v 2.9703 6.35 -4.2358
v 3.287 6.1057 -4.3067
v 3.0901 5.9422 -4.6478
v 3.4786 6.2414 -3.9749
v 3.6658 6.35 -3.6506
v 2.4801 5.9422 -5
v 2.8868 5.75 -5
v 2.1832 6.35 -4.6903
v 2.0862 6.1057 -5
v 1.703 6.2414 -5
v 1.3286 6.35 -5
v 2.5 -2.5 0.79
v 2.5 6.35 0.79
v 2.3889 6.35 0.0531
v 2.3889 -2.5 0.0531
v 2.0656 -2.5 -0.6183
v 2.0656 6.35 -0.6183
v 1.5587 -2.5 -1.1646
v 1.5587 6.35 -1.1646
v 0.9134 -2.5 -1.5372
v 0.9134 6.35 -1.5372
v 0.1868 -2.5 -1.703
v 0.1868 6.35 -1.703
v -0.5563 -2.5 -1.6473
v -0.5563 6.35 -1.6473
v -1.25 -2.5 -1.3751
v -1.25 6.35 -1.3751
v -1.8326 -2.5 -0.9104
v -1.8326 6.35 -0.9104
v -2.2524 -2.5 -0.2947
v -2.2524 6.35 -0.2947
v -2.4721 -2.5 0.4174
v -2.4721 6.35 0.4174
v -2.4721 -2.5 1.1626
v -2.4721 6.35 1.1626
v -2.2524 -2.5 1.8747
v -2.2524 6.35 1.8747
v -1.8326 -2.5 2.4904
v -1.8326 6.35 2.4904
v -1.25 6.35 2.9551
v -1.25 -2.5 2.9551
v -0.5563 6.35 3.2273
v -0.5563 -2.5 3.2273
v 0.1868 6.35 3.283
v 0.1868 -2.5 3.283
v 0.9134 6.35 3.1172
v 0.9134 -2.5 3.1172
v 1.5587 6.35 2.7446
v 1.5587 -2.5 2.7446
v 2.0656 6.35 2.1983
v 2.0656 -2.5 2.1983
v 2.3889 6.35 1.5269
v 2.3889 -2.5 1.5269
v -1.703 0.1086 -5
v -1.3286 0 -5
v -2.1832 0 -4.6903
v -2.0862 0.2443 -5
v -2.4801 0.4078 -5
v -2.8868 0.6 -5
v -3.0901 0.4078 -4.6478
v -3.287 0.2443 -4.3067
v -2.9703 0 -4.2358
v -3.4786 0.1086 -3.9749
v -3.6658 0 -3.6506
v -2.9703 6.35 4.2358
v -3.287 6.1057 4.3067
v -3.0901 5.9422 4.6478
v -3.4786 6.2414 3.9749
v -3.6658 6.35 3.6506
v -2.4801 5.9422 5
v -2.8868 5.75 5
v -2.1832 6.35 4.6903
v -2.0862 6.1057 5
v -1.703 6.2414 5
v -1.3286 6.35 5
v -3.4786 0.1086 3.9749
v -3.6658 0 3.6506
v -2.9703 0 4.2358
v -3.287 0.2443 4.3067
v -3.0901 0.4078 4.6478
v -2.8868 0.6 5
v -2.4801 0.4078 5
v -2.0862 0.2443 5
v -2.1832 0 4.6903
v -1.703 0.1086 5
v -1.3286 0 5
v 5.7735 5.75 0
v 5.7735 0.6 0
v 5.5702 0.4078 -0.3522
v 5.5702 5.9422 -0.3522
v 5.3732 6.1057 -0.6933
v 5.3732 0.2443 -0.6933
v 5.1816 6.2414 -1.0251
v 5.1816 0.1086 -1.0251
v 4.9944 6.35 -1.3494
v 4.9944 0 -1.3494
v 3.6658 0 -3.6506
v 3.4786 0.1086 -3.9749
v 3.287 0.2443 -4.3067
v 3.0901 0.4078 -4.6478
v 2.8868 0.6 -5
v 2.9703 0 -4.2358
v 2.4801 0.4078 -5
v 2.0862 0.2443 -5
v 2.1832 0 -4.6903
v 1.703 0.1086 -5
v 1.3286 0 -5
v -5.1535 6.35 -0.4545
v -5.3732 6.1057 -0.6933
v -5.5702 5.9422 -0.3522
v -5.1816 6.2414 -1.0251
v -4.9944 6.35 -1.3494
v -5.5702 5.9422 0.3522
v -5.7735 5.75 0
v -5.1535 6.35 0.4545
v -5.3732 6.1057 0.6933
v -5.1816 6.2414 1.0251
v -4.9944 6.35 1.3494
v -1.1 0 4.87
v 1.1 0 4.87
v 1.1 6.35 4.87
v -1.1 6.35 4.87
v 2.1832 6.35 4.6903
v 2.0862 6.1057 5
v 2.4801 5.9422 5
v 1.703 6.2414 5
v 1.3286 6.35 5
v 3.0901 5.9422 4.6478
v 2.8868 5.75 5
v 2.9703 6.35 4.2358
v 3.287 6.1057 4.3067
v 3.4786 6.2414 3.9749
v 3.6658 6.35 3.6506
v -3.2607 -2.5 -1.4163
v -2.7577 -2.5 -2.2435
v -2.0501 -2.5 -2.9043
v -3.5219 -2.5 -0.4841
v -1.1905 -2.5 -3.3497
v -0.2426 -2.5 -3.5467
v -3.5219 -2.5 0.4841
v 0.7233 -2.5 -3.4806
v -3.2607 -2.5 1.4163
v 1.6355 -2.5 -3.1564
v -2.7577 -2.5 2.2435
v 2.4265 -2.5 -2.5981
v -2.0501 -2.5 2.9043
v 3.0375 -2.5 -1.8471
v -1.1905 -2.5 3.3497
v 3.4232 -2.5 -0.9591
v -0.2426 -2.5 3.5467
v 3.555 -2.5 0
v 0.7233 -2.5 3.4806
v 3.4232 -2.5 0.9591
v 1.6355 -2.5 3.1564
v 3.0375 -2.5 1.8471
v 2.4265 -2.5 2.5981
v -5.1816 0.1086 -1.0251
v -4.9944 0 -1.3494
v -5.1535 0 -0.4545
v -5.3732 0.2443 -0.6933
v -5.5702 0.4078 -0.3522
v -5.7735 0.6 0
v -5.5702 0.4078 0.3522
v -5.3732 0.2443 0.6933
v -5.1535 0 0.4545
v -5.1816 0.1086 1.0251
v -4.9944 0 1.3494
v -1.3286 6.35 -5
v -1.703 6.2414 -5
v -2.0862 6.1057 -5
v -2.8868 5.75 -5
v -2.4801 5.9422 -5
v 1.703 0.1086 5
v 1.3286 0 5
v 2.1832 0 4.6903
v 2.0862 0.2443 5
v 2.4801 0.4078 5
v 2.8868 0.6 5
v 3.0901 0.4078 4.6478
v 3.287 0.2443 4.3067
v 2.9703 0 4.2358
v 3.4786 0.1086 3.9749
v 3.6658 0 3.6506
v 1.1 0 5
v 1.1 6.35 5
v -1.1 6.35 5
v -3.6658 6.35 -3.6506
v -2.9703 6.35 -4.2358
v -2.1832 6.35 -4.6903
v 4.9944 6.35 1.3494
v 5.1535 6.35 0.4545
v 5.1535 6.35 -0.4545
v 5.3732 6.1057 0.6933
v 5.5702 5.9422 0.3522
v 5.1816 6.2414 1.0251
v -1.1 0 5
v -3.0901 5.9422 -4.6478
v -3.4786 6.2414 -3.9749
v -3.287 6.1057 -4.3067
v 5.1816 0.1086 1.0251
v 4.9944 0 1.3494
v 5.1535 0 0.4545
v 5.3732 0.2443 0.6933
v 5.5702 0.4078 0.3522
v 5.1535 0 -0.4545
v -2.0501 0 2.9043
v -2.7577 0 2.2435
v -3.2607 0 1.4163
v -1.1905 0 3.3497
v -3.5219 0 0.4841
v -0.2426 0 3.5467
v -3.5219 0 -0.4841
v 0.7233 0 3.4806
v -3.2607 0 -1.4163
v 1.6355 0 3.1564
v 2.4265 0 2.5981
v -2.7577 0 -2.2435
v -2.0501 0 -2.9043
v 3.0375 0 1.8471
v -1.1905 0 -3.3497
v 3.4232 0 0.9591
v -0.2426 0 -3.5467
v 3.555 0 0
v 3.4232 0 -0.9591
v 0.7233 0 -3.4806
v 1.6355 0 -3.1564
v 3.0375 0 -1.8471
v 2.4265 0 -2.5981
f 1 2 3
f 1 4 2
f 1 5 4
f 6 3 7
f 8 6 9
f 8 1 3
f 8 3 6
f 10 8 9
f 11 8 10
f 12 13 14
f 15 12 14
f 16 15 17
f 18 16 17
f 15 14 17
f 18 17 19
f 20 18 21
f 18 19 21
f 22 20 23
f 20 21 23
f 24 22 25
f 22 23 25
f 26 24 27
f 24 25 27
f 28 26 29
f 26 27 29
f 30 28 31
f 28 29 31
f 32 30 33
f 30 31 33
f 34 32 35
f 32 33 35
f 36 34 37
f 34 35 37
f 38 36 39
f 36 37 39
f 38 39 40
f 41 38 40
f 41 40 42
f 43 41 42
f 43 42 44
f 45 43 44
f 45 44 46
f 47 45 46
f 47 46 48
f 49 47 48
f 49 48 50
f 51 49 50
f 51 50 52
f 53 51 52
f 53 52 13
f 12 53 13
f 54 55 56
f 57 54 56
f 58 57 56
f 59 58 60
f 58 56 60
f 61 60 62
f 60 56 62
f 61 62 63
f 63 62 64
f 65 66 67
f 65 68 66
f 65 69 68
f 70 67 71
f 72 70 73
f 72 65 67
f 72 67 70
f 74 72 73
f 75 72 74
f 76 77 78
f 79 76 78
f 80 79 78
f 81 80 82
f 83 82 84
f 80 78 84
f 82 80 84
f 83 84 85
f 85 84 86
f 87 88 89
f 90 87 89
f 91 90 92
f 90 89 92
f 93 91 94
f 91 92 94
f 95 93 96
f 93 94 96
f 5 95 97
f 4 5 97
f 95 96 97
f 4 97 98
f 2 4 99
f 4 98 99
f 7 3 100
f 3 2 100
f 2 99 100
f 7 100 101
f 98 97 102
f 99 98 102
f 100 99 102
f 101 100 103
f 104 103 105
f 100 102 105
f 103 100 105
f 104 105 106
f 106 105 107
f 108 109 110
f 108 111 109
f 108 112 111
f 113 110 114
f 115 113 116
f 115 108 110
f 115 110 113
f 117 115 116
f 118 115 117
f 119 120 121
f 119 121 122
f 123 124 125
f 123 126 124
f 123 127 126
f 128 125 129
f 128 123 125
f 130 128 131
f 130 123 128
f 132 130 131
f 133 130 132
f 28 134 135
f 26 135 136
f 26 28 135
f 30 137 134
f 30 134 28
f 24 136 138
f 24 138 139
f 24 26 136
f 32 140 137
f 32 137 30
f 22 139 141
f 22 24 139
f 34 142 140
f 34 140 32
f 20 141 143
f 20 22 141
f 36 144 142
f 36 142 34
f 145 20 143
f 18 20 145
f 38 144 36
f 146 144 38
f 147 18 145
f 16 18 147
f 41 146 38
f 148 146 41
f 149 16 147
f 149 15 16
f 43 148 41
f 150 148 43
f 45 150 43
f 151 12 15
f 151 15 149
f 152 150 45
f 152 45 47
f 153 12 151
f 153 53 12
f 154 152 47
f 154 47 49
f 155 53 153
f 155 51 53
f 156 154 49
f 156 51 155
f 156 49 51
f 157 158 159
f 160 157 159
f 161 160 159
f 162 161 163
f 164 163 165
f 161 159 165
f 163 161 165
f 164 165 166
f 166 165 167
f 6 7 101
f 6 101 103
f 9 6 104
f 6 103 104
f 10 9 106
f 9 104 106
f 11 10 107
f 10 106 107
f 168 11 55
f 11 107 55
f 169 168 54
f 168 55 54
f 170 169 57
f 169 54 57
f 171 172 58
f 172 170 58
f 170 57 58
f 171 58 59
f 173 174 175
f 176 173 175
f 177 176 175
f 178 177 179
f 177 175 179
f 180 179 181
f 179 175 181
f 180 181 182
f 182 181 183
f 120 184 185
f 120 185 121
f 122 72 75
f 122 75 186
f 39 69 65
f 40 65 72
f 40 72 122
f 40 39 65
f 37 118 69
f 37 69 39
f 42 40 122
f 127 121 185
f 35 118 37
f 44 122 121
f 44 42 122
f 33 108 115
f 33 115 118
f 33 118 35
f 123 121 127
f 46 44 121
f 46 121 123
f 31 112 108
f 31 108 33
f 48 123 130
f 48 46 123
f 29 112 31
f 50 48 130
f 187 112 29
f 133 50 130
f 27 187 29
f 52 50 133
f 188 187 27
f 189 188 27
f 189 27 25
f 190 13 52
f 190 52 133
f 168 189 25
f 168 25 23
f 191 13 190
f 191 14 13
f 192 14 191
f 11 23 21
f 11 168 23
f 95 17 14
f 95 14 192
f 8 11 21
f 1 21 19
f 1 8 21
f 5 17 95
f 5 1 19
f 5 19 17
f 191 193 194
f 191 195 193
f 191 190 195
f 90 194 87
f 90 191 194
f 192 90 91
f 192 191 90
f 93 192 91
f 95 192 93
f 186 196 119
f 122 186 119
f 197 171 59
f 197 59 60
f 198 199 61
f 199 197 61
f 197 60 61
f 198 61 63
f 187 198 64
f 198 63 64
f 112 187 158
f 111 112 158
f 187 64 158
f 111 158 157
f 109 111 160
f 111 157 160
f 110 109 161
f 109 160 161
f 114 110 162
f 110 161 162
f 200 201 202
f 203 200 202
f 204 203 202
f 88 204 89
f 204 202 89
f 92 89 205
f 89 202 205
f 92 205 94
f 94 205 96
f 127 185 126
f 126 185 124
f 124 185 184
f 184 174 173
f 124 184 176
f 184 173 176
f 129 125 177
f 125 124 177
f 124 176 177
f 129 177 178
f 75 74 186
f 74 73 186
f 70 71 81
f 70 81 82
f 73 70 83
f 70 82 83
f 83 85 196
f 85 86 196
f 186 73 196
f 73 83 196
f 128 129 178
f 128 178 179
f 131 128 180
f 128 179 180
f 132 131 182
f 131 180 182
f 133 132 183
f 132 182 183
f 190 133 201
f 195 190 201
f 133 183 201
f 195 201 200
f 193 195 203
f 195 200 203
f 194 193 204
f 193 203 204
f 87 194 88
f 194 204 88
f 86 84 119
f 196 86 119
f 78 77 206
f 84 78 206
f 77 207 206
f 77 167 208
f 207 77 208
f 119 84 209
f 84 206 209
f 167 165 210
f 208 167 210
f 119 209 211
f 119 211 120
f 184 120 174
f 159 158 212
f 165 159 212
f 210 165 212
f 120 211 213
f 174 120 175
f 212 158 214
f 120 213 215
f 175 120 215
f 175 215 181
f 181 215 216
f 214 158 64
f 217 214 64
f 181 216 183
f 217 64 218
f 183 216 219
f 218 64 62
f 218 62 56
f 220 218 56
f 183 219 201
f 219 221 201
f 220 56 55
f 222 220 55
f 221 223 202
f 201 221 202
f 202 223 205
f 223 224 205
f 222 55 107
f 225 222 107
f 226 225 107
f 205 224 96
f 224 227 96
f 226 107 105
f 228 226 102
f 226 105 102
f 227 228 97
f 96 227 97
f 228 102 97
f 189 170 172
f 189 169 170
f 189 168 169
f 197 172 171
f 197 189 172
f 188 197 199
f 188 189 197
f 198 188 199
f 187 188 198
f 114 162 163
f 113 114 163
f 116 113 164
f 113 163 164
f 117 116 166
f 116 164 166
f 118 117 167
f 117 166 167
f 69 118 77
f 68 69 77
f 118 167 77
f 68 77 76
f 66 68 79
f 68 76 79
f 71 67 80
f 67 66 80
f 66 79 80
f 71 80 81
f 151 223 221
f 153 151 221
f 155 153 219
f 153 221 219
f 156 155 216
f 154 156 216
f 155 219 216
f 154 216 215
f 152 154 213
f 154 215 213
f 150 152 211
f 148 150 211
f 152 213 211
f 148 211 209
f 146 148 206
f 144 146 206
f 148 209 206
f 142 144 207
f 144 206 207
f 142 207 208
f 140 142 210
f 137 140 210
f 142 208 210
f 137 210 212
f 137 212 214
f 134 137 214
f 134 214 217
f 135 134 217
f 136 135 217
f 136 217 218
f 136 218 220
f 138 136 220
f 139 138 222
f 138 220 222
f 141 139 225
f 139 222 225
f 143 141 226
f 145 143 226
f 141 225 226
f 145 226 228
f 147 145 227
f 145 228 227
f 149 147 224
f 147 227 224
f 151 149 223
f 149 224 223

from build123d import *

# Parameters (mm, degrees)
BOSS_EXTRUDE1_DEPTH = 6.35
SKETCH3_R           = 3.555
BOSS_EXTRUDE3_DEPTH = 2.5
SKETCH4_R           = 2.5
CUT_EXTRUDE1_DEPTH  = 9.85
SKETCH5_W           = 2.2
SKETCH5_H           = 0.13
CUT_EXTRUDE2_DEPTH  = 7.35


with BuildPart() as part:
    # Sketch1 → Boss-Extrude1 (new body)
    with BuildSketch(Plane(origin=(0, 0, 0), x_dir=(1, 0, 0), z_dir=(0, 1, 0))):
        Polygon((5.773502692, 0), (2.886751346, 5), (-2.886751346, 5), (-5.773502692, 0), (-2.886751346, -5), (2.886751346, -5), align=None)
    extrude(amount=BOSS_EXTRUDE1_DEPTH)

    # Sketch3 → Boss-Extrude3 (add)
    with BuildSketch(Plane.XZ):
        Circle(SKETCH3_R)
    extrude(amount=BOSS_EXTRUDE3_DEPTH)

    # Sketch4 → Cut-Extrude1 (cut, through all)
    with BuildSketch(Plane(origin=(0, 6.35, 0), x_dir=(1, 0, 0), z_dir=(0, 1, 0))):
        with Locations((0, -0.79)):
            Circle(SKETCH4_R)
    extrude(amount=-CUT_EXTRUDE1_DEPTH, mode=Mode.SUBTRACT)

    # Sketch5 → Cut-Extrude2 (cut, through all)
    with BuildSketch(Plane(origin=(0, 0, 0), x_dir=(-1, 0, 0), z_dir=(0, -1, 0))):
        with Locations((0, -4.935)):
            Rectangle(SKETCH5_W, SKETCH5_H)
    extrude(amount=-CUT_EXTRUDE2_DEPTH, mode=Mode.SUBTRACT)

    # Sketch6 → Cut-Revolve1 (revolve, cut)
    with BuildSketch(Plane.XY):
        Polygon((5.173502692, 6.35), (5.773502692, 6.35), (5.773502692, 5.75), align=None)
        Polygon((5.773502692, 0.6), (5.173502692, 0), (5.773502692, 0), align=None)
    revolve(axis=Axis((0, 0, 0), (0, 1, 0)), mode=Mode.SUBTRACT)


solid = part.part
